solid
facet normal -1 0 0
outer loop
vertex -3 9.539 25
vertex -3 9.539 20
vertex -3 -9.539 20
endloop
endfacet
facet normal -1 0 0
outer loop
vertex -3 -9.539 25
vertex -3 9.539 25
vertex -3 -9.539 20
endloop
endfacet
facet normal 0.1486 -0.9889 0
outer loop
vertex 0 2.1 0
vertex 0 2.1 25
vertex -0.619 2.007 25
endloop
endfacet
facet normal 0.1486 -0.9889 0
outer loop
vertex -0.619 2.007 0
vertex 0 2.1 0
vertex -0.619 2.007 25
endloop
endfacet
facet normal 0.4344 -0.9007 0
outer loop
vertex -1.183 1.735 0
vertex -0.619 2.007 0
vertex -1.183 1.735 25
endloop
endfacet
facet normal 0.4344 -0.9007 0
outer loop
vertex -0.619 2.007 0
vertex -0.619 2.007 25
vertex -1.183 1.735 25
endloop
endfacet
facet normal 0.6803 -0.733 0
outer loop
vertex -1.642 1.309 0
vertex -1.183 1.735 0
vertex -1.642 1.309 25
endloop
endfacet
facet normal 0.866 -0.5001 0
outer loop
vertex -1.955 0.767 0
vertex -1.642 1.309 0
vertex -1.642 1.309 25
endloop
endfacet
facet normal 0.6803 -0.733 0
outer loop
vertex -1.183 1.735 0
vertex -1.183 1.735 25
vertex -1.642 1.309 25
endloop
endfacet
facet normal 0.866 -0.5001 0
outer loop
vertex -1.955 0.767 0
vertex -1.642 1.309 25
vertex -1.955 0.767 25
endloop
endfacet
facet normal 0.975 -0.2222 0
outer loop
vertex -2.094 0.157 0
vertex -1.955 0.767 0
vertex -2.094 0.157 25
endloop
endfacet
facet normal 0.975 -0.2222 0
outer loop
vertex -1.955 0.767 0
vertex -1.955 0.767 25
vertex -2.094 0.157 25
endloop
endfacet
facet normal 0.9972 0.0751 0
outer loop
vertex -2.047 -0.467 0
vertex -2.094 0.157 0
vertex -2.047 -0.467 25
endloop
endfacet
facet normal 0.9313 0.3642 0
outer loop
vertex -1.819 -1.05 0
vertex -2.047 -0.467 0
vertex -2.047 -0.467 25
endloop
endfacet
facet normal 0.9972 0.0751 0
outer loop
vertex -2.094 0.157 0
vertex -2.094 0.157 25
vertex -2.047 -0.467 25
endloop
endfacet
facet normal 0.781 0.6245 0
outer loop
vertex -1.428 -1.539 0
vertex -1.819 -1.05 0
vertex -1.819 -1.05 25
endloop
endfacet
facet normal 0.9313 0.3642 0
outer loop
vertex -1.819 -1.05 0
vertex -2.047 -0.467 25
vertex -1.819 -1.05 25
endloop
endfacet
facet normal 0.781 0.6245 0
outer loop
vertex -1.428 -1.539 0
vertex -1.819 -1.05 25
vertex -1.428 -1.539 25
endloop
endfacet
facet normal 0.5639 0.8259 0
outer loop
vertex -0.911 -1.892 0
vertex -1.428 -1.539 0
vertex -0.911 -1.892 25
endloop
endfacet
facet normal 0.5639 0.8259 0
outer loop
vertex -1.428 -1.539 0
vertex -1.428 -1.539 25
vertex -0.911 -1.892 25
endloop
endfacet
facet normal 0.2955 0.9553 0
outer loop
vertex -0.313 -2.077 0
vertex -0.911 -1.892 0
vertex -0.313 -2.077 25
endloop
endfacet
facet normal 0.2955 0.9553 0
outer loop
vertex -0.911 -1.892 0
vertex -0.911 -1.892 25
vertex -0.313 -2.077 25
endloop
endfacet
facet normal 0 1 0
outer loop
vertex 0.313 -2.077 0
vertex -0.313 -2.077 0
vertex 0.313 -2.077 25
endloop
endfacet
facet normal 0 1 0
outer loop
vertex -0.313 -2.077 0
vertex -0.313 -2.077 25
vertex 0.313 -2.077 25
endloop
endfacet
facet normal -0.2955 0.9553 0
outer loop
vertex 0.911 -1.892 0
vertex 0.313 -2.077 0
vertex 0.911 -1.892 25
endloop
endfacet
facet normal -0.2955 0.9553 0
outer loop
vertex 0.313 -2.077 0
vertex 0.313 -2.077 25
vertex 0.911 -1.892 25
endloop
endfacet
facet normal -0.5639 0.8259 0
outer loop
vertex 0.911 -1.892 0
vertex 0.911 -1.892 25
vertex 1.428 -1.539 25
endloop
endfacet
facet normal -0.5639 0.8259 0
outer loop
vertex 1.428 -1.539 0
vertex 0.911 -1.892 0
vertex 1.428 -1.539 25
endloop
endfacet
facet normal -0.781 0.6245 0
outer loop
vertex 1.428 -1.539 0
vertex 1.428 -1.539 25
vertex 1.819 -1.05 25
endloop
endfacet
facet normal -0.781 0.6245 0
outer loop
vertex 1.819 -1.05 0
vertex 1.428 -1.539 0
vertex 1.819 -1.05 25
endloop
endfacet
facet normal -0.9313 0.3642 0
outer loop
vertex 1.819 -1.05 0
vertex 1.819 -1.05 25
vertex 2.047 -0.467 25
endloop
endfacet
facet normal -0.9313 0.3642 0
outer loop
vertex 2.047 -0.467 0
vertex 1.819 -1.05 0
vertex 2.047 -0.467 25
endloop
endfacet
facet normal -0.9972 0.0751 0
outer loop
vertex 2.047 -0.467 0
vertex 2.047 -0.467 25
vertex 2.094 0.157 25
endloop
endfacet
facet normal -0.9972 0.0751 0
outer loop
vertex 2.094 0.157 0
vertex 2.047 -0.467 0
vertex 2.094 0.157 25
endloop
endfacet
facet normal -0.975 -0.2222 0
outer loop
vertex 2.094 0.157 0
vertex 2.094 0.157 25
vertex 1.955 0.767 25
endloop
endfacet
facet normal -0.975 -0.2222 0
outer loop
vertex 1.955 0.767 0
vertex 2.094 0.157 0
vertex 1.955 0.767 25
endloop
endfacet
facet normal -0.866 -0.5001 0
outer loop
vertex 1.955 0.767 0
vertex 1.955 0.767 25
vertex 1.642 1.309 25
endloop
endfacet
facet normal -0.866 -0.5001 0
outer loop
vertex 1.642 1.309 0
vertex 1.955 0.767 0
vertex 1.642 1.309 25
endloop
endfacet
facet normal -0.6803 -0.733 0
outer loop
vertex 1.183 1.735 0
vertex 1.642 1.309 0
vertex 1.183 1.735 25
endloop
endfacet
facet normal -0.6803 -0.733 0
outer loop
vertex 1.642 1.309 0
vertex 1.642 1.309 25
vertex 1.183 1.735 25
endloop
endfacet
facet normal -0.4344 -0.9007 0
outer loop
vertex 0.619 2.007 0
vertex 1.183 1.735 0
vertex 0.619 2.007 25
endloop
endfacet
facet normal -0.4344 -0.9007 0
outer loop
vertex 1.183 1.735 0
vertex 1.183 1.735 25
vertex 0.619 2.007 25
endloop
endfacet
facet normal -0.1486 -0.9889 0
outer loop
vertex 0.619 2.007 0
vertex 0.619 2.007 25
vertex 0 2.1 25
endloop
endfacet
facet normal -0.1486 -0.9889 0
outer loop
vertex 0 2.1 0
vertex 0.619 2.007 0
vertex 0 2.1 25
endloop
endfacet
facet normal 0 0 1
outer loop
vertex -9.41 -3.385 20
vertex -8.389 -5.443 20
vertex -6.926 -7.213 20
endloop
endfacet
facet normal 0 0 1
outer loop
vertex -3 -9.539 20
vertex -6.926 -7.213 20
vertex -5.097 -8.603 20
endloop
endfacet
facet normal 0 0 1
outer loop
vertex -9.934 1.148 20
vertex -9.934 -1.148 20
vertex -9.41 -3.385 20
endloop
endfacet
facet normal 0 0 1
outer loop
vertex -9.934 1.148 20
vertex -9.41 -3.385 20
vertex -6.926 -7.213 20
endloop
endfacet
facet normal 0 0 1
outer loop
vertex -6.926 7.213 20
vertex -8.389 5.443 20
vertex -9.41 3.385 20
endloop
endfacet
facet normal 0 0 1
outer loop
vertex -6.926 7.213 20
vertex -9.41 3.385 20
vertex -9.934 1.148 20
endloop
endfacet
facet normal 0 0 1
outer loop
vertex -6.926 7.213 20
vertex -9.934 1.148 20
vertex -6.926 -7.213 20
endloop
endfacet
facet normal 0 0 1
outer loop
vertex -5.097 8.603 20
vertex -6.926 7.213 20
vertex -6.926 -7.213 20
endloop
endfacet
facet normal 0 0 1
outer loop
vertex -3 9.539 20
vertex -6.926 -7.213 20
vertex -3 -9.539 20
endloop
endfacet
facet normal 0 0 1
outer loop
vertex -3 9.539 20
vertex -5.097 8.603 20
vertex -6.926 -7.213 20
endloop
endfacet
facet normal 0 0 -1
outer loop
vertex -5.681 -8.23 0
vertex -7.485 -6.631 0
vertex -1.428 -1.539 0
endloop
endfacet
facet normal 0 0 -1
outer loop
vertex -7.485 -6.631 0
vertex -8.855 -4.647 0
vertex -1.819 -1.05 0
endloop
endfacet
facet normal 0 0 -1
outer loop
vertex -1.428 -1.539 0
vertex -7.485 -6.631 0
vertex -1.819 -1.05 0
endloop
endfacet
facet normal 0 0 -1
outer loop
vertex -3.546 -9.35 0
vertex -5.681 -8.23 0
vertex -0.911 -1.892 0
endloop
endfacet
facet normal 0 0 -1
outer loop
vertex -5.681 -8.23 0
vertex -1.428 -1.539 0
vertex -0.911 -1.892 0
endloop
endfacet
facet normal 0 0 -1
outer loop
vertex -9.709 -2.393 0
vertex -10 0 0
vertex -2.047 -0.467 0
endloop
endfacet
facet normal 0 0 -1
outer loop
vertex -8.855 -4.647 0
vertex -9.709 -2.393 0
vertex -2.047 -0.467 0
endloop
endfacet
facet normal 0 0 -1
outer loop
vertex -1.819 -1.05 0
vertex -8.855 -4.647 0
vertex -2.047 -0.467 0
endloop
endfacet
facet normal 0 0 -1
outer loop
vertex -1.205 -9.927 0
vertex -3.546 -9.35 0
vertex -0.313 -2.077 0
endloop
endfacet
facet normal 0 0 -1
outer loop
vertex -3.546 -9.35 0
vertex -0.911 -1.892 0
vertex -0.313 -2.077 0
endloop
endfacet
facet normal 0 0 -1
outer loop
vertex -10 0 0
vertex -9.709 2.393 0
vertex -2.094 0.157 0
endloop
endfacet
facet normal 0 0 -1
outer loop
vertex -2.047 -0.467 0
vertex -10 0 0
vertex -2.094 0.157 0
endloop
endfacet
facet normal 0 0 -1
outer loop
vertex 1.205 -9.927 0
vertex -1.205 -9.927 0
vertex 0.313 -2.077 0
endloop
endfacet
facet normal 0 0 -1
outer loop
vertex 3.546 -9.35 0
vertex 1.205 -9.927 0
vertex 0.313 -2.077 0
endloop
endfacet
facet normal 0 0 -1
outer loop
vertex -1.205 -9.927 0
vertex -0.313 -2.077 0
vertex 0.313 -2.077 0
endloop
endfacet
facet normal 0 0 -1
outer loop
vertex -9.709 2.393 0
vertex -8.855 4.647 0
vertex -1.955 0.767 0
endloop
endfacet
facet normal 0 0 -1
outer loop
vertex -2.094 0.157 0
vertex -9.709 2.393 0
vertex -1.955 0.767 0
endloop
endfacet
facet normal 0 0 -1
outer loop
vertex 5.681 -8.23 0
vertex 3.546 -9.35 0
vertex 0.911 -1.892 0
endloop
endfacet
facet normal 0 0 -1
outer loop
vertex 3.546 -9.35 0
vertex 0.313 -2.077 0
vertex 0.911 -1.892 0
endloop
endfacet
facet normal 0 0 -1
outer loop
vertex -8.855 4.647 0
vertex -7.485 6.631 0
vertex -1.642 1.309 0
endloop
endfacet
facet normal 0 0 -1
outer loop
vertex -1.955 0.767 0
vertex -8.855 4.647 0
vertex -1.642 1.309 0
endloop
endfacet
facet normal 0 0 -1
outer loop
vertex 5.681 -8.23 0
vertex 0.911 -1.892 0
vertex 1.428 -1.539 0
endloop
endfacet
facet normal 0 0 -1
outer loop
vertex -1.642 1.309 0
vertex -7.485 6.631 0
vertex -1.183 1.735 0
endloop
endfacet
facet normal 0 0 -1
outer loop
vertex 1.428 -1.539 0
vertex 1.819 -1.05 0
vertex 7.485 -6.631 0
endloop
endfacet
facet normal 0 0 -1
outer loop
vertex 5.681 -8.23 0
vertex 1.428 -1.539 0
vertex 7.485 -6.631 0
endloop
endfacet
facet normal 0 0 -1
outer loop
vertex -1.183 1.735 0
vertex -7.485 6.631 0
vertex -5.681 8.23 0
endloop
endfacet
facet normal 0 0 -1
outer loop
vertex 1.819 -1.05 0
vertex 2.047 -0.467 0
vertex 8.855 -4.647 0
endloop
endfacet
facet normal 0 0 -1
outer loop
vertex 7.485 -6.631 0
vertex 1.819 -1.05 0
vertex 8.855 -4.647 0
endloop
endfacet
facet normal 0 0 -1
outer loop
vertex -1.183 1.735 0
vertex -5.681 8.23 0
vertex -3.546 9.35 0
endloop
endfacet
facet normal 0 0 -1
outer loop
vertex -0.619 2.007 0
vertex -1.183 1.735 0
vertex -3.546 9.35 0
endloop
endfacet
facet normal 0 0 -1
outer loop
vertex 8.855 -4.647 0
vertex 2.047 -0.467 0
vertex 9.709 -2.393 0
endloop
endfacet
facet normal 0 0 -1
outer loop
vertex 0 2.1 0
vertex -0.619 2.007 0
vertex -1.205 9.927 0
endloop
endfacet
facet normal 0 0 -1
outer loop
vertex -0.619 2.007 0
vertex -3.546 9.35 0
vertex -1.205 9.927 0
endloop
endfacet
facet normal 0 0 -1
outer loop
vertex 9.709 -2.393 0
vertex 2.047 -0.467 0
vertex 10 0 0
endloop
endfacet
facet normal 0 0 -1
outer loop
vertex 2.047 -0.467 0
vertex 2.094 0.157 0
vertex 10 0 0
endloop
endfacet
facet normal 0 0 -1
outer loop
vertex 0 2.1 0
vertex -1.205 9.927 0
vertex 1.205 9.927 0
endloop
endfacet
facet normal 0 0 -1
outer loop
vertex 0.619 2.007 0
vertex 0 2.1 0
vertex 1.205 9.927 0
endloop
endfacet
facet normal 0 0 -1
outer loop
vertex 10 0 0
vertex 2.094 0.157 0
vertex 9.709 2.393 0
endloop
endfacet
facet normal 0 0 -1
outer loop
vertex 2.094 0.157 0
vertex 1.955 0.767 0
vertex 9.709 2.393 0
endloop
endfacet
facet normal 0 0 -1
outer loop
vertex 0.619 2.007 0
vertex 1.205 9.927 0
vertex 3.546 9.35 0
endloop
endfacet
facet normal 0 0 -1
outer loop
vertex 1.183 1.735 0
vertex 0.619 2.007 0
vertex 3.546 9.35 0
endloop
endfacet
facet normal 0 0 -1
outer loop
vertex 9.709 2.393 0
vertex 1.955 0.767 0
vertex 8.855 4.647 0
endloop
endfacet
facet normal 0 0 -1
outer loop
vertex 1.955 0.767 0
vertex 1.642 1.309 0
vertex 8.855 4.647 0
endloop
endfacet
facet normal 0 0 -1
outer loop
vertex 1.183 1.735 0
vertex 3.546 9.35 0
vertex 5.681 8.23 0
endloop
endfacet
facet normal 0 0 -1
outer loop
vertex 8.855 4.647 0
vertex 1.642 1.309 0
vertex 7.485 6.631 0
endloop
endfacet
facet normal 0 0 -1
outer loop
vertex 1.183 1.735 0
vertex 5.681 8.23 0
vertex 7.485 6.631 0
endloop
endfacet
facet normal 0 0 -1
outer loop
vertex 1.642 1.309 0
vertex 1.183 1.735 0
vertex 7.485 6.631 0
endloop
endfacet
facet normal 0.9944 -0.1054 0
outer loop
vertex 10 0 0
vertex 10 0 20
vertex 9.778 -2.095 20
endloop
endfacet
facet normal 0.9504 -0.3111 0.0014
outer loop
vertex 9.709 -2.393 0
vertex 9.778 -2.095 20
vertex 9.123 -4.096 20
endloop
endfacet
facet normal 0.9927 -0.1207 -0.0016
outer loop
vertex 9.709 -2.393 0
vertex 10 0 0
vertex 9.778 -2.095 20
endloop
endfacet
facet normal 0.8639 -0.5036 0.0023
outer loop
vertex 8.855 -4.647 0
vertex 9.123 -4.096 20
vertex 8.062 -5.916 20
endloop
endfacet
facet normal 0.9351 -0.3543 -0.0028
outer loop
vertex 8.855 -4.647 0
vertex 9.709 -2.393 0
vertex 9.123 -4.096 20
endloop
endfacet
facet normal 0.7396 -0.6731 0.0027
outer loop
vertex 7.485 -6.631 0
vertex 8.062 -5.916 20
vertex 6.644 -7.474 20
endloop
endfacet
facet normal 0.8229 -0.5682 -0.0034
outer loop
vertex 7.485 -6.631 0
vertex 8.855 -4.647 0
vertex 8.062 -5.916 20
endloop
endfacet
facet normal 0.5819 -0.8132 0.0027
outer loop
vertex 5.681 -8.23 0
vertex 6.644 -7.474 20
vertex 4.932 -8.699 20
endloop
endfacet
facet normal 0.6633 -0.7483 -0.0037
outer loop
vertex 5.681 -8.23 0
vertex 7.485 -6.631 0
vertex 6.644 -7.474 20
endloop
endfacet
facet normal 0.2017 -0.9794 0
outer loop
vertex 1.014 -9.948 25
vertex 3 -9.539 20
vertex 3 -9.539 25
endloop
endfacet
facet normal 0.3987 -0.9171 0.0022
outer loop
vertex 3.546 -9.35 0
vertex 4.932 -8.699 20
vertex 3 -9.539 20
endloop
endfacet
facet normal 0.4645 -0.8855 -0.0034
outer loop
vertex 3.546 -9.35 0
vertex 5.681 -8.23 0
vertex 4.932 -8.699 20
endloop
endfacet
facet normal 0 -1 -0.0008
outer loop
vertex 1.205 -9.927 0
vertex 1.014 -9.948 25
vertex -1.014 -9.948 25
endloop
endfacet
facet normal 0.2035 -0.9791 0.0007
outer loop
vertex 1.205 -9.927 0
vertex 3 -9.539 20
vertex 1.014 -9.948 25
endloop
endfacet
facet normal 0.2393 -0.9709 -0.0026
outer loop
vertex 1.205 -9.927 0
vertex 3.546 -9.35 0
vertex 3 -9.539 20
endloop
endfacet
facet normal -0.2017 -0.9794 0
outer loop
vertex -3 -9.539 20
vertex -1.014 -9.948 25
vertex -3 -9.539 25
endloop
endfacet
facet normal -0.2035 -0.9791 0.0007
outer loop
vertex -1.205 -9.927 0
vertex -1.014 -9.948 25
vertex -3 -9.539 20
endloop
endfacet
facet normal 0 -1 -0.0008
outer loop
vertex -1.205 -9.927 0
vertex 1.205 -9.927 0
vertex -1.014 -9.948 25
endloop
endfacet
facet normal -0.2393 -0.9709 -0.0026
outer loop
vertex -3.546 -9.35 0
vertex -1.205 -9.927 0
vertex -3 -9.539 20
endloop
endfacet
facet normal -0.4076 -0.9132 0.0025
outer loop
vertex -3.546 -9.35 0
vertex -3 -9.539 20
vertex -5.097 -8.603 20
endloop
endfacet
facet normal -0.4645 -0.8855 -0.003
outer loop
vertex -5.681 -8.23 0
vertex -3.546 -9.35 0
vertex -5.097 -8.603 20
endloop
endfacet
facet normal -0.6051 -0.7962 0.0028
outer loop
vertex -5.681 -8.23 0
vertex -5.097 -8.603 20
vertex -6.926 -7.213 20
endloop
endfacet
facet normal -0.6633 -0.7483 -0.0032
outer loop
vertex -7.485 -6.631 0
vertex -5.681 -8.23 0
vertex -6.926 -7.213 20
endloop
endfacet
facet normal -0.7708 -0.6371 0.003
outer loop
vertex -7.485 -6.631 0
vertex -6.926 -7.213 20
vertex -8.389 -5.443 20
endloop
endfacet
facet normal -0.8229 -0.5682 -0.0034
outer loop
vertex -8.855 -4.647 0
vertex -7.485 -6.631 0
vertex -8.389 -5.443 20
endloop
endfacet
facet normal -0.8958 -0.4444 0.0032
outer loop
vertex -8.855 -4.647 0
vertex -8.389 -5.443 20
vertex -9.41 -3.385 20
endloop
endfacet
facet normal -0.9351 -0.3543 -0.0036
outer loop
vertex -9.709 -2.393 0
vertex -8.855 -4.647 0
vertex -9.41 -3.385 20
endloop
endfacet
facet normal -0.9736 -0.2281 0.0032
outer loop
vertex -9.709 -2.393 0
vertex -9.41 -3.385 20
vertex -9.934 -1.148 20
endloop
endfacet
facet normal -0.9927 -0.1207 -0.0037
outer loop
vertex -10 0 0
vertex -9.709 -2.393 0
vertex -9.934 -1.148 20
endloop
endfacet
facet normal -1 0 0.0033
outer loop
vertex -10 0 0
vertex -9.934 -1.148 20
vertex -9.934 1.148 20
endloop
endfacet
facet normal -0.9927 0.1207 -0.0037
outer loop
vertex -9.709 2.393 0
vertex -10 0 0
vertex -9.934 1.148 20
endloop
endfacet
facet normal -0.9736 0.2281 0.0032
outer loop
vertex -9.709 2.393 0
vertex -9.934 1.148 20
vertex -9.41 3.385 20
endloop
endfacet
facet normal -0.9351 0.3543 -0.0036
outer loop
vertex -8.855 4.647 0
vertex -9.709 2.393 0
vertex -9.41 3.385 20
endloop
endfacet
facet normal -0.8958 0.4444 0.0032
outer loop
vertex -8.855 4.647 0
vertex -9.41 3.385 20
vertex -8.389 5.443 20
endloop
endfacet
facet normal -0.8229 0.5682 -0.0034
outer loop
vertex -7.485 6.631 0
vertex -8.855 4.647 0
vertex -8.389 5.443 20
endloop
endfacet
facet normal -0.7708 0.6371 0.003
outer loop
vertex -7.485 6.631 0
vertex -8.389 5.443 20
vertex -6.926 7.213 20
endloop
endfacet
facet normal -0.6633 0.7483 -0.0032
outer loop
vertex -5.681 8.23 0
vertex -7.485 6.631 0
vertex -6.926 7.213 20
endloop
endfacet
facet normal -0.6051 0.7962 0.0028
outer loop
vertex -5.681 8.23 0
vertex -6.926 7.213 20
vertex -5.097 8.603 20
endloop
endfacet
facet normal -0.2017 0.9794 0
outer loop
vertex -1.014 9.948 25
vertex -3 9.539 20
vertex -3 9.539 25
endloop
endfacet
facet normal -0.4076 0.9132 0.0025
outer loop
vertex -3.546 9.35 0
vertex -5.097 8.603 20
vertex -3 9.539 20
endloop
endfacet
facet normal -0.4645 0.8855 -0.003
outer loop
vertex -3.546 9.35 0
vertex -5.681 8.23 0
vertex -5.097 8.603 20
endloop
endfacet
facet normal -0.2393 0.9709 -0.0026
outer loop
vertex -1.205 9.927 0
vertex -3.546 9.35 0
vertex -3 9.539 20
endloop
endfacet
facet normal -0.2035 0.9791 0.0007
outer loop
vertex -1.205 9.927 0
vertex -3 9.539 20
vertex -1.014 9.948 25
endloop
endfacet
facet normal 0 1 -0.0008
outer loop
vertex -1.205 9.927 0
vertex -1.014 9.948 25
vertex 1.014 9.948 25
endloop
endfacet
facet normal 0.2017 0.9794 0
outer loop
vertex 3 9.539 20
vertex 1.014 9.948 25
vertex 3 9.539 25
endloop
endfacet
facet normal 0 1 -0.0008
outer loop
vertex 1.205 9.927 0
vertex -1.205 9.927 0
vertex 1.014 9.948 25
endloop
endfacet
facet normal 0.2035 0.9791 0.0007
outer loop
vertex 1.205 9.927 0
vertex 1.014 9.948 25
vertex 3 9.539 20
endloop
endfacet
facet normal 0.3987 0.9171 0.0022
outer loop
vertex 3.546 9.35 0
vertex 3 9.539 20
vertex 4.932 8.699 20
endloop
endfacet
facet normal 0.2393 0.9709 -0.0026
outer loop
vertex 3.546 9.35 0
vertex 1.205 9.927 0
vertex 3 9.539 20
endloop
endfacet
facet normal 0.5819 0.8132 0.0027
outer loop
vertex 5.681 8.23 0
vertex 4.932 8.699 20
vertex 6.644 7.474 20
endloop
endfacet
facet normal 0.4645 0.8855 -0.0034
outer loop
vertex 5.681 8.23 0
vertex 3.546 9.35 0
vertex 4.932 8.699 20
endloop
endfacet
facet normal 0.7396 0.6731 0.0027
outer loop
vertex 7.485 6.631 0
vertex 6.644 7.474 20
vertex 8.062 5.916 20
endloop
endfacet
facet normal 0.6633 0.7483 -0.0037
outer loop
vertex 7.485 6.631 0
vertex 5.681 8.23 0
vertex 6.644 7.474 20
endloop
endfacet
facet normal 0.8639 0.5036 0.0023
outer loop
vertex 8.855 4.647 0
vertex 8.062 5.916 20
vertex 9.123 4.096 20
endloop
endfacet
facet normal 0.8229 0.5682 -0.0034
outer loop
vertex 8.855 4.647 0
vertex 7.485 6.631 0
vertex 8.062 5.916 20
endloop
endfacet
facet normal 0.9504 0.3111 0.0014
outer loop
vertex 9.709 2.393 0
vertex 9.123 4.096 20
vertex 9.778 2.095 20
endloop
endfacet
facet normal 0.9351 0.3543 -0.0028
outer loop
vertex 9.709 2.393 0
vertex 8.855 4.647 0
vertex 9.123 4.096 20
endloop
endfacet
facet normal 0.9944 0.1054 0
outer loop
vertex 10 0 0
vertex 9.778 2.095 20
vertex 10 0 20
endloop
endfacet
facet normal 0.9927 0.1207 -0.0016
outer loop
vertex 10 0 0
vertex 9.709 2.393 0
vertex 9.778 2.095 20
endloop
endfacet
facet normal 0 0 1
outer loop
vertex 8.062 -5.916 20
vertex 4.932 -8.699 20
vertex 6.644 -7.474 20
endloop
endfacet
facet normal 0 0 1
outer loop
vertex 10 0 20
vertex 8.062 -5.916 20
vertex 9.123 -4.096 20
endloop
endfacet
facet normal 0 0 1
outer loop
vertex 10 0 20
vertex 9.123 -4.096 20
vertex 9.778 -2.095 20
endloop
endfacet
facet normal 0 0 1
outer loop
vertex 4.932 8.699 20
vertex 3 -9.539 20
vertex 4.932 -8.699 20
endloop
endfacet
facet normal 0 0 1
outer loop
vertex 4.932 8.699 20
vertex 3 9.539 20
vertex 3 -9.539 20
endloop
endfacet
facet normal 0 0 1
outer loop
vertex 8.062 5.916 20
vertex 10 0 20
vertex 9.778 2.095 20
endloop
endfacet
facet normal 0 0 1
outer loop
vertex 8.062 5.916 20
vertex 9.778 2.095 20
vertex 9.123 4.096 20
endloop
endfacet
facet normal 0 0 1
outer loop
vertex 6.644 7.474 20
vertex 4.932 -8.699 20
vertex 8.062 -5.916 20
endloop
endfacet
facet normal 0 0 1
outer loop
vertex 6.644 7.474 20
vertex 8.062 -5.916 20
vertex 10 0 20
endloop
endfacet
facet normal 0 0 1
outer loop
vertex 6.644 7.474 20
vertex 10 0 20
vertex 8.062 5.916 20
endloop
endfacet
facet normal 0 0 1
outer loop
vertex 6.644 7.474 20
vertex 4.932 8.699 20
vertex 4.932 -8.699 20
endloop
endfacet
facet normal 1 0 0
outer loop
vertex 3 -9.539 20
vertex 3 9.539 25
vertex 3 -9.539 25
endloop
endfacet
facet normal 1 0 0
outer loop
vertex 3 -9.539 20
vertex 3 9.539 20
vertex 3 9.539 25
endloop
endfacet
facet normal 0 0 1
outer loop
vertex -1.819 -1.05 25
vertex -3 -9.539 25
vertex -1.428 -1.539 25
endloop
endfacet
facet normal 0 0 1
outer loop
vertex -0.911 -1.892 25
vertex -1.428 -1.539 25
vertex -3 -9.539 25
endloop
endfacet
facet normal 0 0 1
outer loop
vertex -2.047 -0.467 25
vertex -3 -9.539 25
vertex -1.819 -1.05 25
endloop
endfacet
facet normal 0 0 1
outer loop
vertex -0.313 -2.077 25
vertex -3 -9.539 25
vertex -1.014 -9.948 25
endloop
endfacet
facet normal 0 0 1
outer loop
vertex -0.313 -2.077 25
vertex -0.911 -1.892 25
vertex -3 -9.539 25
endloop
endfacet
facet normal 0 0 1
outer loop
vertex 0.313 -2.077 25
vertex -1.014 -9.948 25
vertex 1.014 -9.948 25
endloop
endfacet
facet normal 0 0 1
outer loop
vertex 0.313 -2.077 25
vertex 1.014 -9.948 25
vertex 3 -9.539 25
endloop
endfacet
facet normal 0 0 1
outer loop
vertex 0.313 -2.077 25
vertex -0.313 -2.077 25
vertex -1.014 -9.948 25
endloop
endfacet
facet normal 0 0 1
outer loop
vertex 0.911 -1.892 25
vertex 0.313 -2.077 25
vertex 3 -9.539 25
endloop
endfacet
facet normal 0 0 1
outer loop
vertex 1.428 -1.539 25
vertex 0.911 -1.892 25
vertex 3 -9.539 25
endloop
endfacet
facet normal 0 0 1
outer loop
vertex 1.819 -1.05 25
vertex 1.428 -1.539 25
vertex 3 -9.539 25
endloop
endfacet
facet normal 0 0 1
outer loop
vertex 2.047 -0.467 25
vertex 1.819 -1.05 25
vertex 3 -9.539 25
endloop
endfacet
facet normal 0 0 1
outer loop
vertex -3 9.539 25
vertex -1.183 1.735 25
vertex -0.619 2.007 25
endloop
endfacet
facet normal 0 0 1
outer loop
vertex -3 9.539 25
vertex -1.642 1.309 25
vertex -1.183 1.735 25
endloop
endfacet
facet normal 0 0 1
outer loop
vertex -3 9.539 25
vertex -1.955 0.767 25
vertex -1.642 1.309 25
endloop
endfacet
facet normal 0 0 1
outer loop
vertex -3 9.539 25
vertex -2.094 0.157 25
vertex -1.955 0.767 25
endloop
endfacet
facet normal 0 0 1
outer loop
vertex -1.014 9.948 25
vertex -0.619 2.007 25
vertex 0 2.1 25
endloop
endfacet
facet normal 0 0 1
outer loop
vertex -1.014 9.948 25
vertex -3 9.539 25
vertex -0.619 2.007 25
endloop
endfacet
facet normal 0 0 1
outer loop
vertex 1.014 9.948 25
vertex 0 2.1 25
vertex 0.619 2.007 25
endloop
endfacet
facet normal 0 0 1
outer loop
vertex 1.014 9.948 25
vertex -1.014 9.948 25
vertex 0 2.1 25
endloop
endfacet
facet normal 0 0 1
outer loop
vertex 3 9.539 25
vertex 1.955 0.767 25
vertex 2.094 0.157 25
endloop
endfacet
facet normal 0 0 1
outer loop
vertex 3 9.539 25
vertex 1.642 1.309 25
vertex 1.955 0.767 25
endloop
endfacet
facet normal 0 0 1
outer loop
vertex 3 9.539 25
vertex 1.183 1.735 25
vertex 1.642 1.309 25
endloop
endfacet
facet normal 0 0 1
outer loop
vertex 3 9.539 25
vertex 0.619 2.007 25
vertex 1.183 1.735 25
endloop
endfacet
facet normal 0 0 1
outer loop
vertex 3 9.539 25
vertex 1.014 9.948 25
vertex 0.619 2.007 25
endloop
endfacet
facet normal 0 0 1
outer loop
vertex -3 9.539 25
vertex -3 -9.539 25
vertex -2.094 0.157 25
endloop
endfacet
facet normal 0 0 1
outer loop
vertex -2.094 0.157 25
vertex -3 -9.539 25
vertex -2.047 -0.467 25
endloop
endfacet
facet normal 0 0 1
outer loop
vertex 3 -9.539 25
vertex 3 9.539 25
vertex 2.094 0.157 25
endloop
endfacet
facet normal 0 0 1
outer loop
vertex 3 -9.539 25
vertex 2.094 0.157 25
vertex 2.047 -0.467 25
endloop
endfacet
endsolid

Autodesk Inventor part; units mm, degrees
ref_plane "YZ Plane" through (0, 0, 0) normal (1, 0, 0) x (0, 1, 0)
ref_plane "XZ Plane" through (0, 0, 0) normal (0, 1, 0) x (-1, 0, 0)
ref_plane "XY Plane" through (0, 0, 0) normal (0, 0, 1) x (1, 0, 0)
sketch "Sketch1" plane through (0, 0, 0) normal (0, 0, 1) x (1, 0, 0)
  circle A0 centre (0, 0) radius 10
  dimension "d0" = 20
extrude "Extrusion1" add sketch "Sketch1" along normal blind 20
sketch "Sketch2" plane through (0, 0, 20) normal (0, 0, 1) x (1, 0, 0)
  circle A0 centre (0, 0) radius 10 projected
  line L0 (0, 10) -> (0, -10) construction
  line L1 (3, 9.5394) -> (3, -9.5394)
  line L2 (-3, 9.5394) -> (-3, -9.5394)
  arc A1 (-3, -9.5394) -> (3, -9.5394) centre (0, 0) ccw
  arc A2 (3, 9.5394) -> (-3, 9.5394) centre (0, 0) ccw
  dimension "d3" = 3
  dimension "d4" = 3
extrude "Extrusion2" add sketch "Sketch2" along normal blind 5 contours L1 A0 L2
hole "Hole1" at (0, 0, 0) direction (0, 0, 1) diameter 4.2 end through all
properties part number "Ender 5 Foot Spacer"
